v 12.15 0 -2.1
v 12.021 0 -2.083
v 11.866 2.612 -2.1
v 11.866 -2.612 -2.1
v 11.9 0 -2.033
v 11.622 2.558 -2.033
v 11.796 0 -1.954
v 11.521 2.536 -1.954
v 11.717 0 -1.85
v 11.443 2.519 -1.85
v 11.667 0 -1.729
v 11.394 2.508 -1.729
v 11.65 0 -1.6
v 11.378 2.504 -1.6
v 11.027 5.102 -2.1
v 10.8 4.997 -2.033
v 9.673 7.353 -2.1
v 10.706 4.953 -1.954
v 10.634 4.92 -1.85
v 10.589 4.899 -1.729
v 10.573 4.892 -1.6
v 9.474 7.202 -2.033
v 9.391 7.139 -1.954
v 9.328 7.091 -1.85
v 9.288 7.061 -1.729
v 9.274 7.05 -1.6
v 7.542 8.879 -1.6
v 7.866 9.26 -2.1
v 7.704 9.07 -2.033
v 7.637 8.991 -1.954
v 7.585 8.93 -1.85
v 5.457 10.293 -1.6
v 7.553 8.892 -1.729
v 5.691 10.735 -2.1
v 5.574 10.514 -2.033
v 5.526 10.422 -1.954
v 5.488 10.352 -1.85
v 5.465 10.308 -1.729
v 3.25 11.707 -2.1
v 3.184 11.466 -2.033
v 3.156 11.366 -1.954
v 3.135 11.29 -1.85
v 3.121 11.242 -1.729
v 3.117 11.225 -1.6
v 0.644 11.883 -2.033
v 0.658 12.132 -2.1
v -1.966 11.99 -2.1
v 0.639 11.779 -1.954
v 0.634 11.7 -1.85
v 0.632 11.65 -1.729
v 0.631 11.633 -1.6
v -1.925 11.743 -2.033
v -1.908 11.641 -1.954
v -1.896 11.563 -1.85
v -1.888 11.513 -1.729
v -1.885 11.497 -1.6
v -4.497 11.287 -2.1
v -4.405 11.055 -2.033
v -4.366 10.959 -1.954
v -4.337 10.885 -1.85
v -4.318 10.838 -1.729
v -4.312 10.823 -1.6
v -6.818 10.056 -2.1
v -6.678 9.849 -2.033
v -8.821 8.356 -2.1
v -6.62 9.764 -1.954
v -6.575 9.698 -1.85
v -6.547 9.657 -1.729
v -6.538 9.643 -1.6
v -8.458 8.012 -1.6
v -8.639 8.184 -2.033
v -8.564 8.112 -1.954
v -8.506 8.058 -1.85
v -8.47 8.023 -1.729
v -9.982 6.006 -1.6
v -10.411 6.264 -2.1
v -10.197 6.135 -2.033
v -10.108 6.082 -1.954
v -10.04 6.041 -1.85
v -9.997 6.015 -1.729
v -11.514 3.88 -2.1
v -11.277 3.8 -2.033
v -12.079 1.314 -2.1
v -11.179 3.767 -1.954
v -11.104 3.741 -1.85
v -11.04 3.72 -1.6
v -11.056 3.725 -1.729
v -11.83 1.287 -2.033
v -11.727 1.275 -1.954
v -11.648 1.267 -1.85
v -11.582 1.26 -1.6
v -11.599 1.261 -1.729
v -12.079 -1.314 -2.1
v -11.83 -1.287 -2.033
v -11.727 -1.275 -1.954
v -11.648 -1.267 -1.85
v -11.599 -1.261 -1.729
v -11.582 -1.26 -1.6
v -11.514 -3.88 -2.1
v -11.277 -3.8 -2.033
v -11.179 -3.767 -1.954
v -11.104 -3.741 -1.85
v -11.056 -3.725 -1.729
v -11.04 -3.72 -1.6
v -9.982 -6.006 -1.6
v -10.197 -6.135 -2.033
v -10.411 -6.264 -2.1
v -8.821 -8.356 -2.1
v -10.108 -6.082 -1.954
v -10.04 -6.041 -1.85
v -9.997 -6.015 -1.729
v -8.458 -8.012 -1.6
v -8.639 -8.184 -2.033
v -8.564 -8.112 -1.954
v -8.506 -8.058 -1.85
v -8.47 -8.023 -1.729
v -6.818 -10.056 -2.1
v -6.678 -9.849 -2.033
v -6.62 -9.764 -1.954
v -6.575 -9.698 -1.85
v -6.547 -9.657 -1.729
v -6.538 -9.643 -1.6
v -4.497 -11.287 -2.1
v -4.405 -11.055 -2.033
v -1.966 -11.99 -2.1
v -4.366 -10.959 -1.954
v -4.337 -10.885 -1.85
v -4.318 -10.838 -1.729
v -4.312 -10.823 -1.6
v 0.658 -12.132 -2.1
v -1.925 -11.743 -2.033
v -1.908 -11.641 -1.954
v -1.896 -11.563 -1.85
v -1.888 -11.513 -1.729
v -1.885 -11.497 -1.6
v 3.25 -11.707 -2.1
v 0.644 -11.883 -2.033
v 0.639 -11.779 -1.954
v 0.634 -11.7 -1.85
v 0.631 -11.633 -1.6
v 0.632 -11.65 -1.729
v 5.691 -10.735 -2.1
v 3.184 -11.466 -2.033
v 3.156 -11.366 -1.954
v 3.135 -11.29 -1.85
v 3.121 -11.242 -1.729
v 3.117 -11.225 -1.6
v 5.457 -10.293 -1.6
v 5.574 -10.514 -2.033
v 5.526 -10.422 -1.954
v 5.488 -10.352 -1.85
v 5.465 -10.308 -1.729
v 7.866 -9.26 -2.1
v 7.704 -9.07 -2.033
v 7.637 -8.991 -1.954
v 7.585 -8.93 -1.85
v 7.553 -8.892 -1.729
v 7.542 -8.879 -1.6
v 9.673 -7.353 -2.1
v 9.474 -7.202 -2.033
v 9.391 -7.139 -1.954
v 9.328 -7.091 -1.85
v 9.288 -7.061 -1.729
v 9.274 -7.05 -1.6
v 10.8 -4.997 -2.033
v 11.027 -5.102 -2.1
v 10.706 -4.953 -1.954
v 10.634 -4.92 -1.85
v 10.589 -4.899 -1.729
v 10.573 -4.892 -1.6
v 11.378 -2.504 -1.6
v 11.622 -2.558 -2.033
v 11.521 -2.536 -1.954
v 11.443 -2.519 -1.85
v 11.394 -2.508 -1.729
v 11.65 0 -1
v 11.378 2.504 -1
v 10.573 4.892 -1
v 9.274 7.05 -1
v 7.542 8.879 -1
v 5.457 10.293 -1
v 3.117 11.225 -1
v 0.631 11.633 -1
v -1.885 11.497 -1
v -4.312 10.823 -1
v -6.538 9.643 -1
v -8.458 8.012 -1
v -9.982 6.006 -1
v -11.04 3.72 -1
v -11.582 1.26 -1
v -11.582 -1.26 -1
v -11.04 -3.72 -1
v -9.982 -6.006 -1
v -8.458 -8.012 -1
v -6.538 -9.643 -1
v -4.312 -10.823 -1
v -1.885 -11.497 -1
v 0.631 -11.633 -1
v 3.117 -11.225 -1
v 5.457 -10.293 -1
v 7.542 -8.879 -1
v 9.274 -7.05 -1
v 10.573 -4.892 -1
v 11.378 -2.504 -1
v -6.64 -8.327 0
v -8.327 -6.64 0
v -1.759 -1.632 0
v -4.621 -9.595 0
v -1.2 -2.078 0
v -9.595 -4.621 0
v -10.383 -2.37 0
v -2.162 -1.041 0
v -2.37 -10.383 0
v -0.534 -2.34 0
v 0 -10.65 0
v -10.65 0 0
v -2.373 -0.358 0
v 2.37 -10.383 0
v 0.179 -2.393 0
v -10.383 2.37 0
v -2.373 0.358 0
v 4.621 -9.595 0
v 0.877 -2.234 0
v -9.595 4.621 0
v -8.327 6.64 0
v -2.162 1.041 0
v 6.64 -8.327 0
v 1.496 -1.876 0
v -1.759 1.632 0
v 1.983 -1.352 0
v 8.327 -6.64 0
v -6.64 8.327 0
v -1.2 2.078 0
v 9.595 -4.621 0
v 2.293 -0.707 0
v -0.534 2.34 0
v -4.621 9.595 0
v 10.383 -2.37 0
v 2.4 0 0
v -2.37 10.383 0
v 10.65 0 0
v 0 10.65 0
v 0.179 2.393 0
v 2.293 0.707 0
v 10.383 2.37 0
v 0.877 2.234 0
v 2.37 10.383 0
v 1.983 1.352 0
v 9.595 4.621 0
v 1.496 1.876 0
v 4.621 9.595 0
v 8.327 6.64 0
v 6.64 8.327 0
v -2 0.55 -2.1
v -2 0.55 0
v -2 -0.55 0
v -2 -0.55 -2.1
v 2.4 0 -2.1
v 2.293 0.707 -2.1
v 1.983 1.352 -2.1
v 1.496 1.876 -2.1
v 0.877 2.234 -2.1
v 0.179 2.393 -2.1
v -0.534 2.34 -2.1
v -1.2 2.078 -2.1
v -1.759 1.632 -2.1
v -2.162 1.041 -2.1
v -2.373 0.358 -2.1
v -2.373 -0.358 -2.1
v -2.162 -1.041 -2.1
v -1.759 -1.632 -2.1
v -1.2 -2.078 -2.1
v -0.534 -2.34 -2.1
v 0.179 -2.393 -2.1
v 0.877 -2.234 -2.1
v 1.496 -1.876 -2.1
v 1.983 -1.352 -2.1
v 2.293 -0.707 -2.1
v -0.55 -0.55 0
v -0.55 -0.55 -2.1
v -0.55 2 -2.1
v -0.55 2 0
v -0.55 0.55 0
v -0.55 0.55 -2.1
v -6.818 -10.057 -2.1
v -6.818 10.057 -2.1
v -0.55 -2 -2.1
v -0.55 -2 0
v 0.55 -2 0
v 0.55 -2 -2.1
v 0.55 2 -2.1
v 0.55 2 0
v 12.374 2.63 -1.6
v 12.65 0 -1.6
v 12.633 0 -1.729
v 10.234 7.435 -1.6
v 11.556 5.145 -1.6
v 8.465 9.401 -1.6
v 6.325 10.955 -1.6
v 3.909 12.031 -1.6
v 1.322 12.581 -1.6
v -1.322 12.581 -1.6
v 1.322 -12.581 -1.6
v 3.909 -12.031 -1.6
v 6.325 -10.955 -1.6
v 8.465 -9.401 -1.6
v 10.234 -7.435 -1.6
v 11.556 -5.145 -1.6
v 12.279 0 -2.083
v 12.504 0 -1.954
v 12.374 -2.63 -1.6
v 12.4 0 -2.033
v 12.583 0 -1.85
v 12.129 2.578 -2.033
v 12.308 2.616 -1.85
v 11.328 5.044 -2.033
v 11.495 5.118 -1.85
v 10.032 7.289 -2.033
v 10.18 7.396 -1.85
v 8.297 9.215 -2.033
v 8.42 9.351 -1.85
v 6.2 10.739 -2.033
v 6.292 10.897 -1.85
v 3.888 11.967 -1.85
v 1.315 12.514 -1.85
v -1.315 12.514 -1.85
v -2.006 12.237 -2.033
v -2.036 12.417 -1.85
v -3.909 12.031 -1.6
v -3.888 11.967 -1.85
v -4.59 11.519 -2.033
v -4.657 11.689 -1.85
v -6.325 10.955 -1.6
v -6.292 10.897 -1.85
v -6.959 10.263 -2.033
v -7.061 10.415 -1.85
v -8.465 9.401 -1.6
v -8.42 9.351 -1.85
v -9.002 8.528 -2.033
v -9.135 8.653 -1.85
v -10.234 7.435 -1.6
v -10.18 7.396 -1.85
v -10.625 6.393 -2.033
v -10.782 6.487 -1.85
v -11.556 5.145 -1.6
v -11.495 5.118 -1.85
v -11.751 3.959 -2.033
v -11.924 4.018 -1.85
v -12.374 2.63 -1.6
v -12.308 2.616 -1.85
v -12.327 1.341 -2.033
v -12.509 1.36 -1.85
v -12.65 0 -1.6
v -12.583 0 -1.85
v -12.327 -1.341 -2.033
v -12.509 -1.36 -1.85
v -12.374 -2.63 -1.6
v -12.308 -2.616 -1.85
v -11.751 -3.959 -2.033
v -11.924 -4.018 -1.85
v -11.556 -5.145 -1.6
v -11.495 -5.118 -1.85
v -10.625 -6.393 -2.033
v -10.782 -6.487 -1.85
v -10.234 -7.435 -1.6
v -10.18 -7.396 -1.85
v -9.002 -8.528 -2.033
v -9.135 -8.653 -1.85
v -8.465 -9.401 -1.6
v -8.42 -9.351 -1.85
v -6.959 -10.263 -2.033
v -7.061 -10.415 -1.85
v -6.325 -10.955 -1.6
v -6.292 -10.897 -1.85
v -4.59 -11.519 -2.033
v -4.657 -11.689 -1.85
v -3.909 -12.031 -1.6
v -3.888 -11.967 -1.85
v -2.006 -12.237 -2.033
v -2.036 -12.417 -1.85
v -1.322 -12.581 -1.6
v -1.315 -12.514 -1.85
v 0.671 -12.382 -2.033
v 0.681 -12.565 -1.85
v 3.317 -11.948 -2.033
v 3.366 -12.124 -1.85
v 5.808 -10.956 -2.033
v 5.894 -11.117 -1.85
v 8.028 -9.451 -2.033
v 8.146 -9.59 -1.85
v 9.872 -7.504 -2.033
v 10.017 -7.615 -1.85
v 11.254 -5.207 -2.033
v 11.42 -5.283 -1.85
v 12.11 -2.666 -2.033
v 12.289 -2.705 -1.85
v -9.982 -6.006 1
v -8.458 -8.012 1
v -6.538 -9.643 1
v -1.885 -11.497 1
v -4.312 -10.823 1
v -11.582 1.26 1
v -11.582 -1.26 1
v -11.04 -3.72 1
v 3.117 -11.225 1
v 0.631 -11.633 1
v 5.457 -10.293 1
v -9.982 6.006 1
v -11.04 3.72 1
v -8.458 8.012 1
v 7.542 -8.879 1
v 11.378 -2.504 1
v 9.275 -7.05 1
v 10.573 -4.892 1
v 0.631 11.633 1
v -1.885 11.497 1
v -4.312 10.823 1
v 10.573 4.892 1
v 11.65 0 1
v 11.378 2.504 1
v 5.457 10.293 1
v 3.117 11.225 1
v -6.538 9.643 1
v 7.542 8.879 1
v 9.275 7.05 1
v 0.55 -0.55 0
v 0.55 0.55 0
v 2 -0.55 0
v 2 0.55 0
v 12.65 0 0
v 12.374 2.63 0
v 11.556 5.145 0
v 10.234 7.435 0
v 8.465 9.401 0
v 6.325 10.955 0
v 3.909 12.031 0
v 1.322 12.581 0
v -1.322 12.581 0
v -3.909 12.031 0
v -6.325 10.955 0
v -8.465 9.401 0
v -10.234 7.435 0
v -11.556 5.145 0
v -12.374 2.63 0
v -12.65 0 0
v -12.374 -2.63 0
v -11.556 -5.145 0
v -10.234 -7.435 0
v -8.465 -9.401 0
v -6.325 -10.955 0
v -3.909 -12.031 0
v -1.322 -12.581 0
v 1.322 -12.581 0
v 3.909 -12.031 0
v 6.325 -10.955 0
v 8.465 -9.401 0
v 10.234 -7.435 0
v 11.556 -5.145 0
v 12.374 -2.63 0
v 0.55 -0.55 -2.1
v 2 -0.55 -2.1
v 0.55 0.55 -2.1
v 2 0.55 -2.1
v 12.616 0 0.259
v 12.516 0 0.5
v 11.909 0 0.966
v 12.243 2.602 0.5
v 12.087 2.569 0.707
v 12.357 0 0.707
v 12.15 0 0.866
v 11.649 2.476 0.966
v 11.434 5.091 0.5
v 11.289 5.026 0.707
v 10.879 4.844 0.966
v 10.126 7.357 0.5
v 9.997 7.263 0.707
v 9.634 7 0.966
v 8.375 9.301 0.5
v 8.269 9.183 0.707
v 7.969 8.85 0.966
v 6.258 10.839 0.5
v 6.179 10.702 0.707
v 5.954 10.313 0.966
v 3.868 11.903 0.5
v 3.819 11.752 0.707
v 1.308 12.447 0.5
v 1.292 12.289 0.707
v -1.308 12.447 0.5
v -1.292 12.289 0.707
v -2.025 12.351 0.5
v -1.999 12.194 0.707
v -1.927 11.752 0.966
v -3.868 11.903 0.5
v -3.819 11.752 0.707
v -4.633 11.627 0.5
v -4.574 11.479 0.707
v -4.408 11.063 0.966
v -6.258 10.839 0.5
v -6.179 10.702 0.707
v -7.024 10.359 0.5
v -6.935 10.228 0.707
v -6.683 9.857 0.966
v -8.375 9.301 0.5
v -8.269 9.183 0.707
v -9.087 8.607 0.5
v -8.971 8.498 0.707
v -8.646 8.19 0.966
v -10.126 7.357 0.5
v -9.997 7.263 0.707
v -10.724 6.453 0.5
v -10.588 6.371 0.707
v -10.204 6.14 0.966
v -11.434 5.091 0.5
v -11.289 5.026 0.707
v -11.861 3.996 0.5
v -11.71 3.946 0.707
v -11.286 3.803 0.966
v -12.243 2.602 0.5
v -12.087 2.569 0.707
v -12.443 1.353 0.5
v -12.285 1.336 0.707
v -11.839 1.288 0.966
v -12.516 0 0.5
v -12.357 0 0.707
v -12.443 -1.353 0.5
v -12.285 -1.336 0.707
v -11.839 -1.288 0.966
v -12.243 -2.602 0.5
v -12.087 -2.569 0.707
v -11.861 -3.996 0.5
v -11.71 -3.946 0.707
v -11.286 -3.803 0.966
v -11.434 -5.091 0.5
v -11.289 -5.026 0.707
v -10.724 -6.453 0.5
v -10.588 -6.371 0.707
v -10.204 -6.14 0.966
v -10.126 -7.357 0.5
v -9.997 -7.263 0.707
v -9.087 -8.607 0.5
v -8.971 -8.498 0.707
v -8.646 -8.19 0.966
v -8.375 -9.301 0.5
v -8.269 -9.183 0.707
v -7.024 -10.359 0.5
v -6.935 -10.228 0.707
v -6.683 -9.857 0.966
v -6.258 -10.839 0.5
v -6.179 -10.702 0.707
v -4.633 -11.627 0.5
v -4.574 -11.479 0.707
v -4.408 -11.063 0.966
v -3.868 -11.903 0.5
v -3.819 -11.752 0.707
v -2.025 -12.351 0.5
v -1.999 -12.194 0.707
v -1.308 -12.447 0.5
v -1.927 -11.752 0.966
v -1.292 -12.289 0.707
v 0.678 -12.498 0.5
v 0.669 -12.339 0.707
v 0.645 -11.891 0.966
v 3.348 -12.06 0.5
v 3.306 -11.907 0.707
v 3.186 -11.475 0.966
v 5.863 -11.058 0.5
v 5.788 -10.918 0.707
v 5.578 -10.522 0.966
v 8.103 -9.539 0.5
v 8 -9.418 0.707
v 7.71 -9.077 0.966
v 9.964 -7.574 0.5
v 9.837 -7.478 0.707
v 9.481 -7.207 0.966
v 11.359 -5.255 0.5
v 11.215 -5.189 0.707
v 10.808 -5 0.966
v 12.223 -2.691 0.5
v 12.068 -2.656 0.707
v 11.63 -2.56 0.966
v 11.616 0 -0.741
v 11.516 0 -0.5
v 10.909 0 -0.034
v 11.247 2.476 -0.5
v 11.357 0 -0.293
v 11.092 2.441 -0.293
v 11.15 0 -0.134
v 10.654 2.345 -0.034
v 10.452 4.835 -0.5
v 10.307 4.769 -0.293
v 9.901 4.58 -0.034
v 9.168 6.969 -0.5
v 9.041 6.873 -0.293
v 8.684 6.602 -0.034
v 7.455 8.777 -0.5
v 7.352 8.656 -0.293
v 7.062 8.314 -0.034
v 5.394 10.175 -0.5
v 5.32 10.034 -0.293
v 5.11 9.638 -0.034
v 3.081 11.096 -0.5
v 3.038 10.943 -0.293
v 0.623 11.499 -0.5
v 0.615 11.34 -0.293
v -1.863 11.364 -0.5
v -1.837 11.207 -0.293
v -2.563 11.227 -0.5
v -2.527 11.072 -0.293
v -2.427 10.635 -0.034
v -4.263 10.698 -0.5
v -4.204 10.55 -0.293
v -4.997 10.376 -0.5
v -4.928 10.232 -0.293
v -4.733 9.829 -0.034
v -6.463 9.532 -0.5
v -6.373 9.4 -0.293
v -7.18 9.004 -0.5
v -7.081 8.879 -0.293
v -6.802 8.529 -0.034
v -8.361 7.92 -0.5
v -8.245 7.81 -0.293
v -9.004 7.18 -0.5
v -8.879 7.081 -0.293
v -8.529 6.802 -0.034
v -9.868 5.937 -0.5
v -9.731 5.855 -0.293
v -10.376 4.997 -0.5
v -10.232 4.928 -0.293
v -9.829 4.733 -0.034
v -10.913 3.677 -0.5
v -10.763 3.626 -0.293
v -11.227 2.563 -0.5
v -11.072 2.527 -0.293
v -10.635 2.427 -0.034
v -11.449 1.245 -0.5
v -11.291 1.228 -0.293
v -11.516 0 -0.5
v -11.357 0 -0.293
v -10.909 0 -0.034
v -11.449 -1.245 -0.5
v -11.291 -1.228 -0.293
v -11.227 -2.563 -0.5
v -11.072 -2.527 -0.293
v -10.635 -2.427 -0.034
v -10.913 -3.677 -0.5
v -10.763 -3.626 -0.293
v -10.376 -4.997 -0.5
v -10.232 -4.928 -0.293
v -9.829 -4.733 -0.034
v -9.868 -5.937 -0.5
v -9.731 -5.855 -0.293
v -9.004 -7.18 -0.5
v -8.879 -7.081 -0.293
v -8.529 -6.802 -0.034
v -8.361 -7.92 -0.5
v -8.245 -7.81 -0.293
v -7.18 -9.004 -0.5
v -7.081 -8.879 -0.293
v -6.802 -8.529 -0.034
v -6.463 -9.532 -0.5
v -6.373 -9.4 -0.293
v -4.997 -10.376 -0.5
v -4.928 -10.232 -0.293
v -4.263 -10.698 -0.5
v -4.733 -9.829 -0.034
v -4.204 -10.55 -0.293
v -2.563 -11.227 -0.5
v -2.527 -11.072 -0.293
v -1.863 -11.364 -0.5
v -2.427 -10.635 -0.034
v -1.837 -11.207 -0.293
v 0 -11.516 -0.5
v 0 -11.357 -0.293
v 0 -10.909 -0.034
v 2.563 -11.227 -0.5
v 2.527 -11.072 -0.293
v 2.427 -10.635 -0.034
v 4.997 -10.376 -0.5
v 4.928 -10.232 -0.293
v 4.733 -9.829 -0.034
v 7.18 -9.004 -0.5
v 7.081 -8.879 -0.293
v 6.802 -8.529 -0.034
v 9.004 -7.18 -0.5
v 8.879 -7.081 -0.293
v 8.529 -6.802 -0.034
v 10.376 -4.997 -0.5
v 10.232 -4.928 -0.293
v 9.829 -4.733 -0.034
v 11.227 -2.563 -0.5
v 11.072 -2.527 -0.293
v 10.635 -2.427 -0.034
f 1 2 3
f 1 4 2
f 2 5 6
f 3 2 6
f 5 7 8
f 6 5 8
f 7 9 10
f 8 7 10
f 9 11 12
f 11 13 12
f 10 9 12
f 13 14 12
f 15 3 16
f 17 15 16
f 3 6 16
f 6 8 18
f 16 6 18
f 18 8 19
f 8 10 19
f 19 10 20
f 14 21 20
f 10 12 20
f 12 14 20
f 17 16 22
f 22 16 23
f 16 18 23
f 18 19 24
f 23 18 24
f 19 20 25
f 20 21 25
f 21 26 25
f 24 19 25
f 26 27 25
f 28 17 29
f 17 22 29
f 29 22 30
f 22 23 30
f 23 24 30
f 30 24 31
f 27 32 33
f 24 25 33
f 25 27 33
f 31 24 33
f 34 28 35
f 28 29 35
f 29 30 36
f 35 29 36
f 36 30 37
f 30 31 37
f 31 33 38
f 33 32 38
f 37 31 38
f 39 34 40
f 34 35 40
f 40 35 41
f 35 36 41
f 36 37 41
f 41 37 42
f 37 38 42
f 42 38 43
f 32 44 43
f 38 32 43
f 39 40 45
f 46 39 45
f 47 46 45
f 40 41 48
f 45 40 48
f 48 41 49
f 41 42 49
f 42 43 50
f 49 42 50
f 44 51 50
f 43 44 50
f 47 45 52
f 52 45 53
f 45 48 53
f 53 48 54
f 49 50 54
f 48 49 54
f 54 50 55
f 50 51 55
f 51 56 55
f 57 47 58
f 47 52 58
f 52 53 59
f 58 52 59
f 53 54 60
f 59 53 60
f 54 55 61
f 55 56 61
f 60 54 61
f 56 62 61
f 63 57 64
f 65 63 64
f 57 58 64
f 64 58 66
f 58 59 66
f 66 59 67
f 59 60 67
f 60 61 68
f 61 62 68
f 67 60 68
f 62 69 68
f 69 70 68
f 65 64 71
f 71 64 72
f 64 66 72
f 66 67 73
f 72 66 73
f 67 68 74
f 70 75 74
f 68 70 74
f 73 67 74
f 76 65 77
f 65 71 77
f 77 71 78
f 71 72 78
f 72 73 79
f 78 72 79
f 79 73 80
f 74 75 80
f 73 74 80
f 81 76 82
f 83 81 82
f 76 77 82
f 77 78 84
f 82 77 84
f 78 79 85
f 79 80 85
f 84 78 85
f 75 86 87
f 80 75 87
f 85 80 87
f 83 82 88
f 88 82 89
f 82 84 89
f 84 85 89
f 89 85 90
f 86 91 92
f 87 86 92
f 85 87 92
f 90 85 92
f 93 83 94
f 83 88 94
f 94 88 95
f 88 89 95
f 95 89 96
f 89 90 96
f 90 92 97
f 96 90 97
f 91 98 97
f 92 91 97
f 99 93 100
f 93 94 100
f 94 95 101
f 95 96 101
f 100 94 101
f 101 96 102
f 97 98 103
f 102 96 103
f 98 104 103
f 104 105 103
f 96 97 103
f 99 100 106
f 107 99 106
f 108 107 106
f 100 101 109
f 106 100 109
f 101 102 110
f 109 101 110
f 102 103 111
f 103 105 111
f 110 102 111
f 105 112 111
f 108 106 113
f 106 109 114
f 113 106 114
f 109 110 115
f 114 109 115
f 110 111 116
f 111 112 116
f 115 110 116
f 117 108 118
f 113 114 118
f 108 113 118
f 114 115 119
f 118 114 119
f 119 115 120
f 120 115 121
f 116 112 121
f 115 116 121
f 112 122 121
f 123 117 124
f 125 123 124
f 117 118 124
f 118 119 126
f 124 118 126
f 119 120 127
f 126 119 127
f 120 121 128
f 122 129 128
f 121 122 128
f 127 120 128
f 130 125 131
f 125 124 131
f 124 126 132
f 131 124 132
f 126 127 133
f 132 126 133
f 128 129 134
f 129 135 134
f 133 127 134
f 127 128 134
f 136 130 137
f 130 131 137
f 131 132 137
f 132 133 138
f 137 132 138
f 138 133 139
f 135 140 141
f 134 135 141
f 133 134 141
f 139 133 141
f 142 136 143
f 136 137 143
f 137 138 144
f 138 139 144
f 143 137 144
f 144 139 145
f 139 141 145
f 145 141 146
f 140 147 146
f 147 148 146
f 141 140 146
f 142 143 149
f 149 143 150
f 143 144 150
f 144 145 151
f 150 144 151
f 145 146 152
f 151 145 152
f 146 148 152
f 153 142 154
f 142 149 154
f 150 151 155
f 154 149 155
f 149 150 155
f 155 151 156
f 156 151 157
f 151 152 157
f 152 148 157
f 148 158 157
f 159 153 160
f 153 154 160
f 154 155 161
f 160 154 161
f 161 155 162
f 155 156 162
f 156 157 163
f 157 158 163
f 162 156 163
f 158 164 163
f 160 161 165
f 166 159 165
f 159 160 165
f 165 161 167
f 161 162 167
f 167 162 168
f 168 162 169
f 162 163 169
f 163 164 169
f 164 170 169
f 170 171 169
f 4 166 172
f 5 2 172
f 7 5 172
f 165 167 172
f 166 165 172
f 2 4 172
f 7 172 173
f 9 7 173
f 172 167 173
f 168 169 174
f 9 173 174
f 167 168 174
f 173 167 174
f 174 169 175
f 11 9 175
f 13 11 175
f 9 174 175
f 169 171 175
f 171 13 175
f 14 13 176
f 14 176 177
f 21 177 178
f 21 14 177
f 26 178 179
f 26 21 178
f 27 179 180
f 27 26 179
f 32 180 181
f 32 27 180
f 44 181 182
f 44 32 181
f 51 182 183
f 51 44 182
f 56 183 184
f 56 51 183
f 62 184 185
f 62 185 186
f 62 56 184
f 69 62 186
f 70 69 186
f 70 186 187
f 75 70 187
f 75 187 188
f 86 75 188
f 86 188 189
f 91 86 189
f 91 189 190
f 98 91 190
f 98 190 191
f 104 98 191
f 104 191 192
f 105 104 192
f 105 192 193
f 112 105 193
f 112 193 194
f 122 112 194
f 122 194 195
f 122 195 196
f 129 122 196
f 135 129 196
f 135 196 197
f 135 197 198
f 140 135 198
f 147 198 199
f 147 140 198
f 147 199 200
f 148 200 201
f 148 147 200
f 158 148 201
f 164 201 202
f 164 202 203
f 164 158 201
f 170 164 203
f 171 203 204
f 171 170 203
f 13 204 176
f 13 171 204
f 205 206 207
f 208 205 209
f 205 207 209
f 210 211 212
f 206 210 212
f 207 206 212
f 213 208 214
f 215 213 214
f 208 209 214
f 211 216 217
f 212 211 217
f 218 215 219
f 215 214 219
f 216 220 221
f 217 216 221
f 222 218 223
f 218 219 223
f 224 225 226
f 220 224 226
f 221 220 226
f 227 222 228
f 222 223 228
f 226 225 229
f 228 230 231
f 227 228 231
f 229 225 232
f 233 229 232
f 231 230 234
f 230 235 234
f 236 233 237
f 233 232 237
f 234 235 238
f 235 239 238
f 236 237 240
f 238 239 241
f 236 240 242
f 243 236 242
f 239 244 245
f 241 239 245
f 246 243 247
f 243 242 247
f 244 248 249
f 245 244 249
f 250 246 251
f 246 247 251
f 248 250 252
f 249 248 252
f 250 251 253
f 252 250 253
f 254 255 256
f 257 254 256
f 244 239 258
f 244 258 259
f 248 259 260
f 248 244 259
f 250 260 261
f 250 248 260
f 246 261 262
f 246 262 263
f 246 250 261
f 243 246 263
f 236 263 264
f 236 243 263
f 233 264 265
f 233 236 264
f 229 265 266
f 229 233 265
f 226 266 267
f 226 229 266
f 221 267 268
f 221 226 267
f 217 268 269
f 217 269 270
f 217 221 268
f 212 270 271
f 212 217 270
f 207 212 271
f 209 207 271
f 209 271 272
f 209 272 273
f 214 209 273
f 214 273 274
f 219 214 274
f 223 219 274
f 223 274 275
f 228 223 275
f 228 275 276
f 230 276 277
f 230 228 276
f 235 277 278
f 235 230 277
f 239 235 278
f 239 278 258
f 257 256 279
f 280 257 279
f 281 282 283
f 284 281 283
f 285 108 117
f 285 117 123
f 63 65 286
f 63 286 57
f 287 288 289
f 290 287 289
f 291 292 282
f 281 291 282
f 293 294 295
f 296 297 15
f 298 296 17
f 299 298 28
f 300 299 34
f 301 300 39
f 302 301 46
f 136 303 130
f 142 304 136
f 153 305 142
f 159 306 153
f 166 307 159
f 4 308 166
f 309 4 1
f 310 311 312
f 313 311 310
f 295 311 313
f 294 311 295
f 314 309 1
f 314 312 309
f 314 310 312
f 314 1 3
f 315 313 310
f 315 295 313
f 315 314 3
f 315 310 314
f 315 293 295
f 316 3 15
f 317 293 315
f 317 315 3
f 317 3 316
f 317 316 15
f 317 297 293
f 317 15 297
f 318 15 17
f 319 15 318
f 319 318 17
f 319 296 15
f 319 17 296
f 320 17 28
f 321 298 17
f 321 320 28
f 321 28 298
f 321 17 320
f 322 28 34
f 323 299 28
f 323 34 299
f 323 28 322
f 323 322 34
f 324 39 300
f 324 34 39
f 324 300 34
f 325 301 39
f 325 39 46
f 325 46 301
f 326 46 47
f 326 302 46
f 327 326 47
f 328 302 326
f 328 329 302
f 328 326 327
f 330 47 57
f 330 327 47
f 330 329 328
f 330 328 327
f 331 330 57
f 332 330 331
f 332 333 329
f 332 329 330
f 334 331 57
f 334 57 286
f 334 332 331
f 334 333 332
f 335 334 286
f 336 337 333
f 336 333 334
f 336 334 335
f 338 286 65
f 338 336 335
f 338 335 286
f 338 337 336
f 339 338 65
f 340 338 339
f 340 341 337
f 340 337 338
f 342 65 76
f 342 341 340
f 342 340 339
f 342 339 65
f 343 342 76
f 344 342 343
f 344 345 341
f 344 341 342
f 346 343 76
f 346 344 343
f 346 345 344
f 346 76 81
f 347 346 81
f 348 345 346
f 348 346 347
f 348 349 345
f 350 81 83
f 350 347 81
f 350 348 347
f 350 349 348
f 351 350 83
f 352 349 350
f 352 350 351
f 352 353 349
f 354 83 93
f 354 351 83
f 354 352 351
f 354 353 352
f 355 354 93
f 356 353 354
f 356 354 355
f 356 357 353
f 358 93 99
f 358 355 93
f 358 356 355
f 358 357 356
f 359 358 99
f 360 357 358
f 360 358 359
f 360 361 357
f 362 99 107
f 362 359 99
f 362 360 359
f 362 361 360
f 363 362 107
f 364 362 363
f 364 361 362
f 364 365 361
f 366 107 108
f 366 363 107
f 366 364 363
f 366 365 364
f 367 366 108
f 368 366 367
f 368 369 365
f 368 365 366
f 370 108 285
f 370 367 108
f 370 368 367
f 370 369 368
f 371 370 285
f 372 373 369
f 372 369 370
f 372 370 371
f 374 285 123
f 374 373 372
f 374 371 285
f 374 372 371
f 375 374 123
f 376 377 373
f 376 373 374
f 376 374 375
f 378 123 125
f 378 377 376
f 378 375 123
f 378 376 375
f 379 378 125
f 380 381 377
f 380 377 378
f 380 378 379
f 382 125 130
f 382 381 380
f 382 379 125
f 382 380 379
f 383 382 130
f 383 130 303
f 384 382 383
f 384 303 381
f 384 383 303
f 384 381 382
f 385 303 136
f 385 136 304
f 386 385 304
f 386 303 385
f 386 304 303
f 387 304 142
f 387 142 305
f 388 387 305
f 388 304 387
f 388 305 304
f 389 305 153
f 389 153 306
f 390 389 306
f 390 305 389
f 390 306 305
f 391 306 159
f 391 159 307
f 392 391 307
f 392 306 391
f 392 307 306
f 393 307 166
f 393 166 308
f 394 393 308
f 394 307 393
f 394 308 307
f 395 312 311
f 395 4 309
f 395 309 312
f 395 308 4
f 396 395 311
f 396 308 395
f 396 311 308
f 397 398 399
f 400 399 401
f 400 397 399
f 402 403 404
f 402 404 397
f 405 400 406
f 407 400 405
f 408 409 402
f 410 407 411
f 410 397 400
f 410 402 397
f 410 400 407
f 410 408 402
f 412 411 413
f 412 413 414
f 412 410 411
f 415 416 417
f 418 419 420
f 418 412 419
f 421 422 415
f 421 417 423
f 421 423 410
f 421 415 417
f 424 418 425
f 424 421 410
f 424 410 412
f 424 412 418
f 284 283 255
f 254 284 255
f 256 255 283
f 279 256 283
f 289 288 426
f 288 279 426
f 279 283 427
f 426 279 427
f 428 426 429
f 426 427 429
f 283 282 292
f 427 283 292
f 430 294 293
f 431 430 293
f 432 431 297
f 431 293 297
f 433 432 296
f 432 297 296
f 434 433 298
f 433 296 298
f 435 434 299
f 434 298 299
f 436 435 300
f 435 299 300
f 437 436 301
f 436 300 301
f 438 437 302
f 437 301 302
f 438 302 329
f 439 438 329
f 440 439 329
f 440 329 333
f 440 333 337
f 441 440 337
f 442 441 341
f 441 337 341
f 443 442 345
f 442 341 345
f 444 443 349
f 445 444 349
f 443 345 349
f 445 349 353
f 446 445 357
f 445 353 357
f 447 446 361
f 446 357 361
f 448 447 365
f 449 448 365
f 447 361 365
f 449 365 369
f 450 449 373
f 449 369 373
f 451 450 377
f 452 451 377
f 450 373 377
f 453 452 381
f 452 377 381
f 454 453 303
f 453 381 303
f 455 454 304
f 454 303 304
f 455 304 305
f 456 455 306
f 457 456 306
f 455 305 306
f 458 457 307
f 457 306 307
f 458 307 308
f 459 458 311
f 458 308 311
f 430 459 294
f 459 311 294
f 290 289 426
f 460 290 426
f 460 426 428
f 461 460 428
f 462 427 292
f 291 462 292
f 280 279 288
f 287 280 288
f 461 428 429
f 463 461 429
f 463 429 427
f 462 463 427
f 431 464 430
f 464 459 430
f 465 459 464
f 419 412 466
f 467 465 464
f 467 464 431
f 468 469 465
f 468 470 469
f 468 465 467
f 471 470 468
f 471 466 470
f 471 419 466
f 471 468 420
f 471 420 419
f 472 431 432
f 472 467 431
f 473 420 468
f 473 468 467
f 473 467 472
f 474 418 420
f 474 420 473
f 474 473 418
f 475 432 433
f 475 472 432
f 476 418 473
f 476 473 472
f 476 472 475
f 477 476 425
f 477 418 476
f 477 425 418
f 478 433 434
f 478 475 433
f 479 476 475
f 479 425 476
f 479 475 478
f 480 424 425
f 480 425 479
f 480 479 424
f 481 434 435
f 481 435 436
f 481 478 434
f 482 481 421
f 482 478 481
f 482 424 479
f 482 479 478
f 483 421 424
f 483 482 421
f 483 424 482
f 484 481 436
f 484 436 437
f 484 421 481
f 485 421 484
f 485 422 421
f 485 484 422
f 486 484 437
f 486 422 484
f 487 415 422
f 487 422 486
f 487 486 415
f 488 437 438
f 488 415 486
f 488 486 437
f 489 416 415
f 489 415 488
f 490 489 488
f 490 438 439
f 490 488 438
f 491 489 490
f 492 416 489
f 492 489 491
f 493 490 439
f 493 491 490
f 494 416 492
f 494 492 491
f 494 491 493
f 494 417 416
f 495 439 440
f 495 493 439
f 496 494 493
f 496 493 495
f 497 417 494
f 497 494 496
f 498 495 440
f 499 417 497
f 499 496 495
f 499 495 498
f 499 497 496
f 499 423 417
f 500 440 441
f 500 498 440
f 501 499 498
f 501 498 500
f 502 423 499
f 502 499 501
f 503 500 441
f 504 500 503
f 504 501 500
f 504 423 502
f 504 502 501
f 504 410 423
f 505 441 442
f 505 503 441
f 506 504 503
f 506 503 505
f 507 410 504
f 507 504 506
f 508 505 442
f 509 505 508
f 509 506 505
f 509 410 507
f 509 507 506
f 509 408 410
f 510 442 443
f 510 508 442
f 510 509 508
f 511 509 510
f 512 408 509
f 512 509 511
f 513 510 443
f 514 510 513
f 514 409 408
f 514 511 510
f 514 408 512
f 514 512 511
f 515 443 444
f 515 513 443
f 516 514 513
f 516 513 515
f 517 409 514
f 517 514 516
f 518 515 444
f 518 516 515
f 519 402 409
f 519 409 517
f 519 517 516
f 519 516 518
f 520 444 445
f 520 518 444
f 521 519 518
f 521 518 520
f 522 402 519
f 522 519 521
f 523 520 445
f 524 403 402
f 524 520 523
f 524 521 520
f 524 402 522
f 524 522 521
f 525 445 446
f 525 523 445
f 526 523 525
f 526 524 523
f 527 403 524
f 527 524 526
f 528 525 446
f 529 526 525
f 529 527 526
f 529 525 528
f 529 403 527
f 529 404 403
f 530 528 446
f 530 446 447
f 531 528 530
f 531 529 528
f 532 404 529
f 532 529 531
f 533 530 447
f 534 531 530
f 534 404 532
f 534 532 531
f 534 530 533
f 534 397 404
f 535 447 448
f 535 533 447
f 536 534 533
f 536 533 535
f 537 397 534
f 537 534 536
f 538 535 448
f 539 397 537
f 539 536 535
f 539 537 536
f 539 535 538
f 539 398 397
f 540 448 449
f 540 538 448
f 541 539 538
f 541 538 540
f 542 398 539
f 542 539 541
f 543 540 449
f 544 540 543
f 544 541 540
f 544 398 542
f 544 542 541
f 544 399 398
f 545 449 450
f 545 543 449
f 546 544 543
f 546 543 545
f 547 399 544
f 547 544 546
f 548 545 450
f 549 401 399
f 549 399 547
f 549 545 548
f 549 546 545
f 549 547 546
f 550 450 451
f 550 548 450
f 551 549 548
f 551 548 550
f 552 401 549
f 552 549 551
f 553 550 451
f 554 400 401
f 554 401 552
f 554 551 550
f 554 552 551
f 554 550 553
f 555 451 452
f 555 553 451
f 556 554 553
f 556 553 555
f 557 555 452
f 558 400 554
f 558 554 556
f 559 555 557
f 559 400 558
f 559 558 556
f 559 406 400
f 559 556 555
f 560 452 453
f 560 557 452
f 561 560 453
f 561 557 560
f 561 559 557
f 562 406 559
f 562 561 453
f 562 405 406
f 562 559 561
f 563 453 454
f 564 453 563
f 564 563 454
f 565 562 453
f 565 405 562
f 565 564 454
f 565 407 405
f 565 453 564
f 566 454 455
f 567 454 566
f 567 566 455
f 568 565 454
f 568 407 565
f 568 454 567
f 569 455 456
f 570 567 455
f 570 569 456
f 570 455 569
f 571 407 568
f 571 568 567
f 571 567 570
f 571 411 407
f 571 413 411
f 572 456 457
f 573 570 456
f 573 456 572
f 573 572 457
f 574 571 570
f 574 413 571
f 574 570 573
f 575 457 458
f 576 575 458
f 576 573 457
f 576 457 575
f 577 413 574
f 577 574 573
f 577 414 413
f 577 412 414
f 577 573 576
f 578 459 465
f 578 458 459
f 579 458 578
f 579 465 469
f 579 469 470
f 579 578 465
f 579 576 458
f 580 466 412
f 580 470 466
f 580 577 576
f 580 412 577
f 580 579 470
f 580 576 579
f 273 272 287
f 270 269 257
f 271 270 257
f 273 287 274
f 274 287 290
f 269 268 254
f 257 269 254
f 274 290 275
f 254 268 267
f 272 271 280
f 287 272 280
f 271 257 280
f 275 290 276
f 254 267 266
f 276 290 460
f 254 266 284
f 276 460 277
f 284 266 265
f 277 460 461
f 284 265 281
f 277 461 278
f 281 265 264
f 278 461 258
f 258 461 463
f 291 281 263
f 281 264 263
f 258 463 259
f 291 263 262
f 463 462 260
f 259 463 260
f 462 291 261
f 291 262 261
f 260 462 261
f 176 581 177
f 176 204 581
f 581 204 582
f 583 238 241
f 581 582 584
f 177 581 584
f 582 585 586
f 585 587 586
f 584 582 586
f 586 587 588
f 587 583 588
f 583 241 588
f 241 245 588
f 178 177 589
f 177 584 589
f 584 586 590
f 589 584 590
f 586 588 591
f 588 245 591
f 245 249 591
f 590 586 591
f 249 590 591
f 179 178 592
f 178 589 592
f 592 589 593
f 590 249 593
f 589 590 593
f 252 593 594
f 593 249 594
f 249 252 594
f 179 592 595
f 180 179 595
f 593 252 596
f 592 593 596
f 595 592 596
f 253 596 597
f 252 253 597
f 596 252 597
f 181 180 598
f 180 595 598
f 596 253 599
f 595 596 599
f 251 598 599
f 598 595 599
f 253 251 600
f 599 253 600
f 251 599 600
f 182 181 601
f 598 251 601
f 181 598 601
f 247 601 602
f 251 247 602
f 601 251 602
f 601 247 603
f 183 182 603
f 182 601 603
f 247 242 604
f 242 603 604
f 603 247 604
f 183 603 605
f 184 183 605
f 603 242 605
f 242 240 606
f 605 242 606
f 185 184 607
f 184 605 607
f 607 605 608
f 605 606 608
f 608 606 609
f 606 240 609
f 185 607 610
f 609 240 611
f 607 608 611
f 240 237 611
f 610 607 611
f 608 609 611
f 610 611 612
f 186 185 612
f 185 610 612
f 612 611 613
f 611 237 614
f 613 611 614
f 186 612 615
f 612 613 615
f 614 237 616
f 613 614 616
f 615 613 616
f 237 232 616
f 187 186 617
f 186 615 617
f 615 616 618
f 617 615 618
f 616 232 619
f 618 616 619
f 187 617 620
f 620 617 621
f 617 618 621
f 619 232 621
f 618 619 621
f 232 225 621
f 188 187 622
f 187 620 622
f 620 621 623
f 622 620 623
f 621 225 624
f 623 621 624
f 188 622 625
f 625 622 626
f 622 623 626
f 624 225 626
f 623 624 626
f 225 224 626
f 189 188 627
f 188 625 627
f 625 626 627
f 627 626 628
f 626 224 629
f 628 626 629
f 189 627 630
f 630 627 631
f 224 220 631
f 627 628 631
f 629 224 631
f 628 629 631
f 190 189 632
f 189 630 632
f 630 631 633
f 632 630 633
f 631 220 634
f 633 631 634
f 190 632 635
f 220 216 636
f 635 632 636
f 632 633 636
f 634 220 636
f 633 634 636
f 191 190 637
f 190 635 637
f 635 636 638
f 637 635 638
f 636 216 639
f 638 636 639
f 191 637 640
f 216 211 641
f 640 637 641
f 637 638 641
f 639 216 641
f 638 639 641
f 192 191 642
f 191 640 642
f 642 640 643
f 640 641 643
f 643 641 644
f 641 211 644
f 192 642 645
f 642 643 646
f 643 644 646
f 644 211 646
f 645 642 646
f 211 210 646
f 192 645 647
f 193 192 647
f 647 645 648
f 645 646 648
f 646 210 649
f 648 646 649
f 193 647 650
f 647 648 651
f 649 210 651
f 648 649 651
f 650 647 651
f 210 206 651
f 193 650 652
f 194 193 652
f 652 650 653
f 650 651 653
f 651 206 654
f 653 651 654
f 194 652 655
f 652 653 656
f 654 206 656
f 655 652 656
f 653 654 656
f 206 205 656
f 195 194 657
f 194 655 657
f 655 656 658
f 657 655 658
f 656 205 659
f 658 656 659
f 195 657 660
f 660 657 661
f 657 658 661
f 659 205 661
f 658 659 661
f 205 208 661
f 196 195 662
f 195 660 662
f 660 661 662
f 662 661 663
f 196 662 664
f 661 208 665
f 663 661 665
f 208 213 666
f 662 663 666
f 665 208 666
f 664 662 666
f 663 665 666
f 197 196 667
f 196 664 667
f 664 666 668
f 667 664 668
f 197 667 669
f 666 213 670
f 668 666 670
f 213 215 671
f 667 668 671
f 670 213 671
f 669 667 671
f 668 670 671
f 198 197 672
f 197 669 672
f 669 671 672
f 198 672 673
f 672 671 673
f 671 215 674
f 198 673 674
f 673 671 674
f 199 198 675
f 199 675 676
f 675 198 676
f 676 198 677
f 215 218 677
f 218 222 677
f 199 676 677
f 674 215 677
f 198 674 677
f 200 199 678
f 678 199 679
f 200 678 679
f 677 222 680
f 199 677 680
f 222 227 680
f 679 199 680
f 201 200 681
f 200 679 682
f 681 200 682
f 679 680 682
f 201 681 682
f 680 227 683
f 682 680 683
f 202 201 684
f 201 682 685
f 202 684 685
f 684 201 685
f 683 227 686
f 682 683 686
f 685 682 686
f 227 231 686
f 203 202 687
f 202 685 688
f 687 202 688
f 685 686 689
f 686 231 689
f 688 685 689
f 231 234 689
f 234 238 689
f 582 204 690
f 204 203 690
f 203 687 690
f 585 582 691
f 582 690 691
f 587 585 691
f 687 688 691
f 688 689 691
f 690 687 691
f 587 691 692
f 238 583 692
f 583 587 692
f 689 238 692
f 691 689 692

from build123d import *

# Parameters (mm, degrees)
SKETCH_1_R           = 2.4
EXTRUDE_1_DEPTH      = 2.1
EXTRUDE_START        = 1
SKETCH_1_9_R         = 11.65
SKETCH_1_9_R_2       = 2.4
EXTRUDE_2_DEPTH      = 1
EXTRUDE_3_DEPTH      = 1
EXTRUDE_3_DEPTH_BACK = 2.1
SKETCH_1_10_R        = 12.65
SKETCH_1_10_R_2      = 11.65
FILLET_1_R           = 1
FILLET_2_R           = 0.5
FILLET_3_R           = 0.5
FILLET_4_R           = 1


with BuildPart() as part:
    # 草图1 → 凸台-拉伸1 (new body)
    with BuildSketch(Plane.XY):
        Circle(SKETCH_1_R)
        Polygon((0.55, -2), (0.55, -0.55), (2, -0.55), (2, 0.55), (0.55, 0.55), (0.55, 2), (-0.55, 2), (-0.55, 0.55), (-2, 0.55), (-2, -0.55), (-0.55, -0.55), (-0.55, -2), align=None, mode=Mode.SUBTRACT)
    extrude(amount=-EXTRUDE_1_DEPTH)

    # 草图1<9> → 凸台-拉伸2 (add)
    # profile 1 of 3: a face of its own
    with BuildSketch(Plane.XY.offset(EXTRUDE_START)):
        Circle(SKETCH_1_9_R)
        Circle(SKETCH_1_9_R_2, mode=Mode.SUBTRACT)
    # profile 2 of 3: a face of its own
    with BuildSketch(Plane.XY.offset(EXTRUDE_START)):
        Circle(SKETCH_1_9_R_2)
        Polygon((0.55, -2), (0.55, -0.55), (2, -0.55), (2, 0.55), (0.55, 0.55), (0.55, 2), (-0.55, 2), (-0.55, 0.55), (-2, 0.55), (-2, -0.55), (-0.55, -0.55), (-0.55, -2), align=None, mode=Mode.SUBTRACT)
    # profile 3 of 3: a face of its own
    with BuildSketch(Plane.XY.offset(EXTRUDE_START)):
        Polygon((-0.55, -2), (0.55, -2), (0.55, -0.55), (2, -0.55), (2, 0.55), (0.55, 0.55), (0.55, 2), (-0.55, 2), (-0.55, 0.55), (-2, 0.55), (-2, -0.55), (-0.55, -0.55), align=None)
    extrude(amount=-EXTRUDE_2_DEPTH)

    # 草图1<10> → 凸台-拉伸3 (add, two sides: drawn at the far end of the back side and taken through both)
    with BuildSketch(Plane.XY.offset(-EXTRUDE_3_DEPTH_BACK)):
        Circle(SKETCH_1_10_R)
        Circle(SKETCH_1_10_R_2, mode=Mode.SUBTRACT)
    extrude(amount=EXTRUDE_3_DEPTH + EXTRUDE_3_DEPTH_BACK)

    # 圆角1
    fillet_1_edges = [part.edges().sort_by_distance(p)[0] for p in [
        (-12.65, 0, 1),
    ]]
    fillet(fillet_1_edges, radius=FILLET_1_R - 0.0001)  # a hair under: the kernel refuses the full size

    # 圆角2
    fillet_2_edges = [part.edges().sort_by_distance(p)[0] for p in [
        (-11.65, 0, -2.1),
    ]]
    fillet(fillet_2_edges, radius=FILLET_2_R)

    # 圆角3
    fillet_3_edges = [part.edges().sort_by_distance(p)[0] for p in [
        (-12.65, 0, -2.1),
    ]]
    fillet(fillet_3_edges, radius=FILLET_3_R - 0.0001)  # a hair under: the kernel refuses the full size

    # 圆角4
    fillet_4_edges = [part.edges().sort_by_distance(p)[0] for p in [
        (-11.65, 0, 0),
    ]]
    fillet(fillet_4_edges, radius=FILLET_4_R)


solid = part.part
